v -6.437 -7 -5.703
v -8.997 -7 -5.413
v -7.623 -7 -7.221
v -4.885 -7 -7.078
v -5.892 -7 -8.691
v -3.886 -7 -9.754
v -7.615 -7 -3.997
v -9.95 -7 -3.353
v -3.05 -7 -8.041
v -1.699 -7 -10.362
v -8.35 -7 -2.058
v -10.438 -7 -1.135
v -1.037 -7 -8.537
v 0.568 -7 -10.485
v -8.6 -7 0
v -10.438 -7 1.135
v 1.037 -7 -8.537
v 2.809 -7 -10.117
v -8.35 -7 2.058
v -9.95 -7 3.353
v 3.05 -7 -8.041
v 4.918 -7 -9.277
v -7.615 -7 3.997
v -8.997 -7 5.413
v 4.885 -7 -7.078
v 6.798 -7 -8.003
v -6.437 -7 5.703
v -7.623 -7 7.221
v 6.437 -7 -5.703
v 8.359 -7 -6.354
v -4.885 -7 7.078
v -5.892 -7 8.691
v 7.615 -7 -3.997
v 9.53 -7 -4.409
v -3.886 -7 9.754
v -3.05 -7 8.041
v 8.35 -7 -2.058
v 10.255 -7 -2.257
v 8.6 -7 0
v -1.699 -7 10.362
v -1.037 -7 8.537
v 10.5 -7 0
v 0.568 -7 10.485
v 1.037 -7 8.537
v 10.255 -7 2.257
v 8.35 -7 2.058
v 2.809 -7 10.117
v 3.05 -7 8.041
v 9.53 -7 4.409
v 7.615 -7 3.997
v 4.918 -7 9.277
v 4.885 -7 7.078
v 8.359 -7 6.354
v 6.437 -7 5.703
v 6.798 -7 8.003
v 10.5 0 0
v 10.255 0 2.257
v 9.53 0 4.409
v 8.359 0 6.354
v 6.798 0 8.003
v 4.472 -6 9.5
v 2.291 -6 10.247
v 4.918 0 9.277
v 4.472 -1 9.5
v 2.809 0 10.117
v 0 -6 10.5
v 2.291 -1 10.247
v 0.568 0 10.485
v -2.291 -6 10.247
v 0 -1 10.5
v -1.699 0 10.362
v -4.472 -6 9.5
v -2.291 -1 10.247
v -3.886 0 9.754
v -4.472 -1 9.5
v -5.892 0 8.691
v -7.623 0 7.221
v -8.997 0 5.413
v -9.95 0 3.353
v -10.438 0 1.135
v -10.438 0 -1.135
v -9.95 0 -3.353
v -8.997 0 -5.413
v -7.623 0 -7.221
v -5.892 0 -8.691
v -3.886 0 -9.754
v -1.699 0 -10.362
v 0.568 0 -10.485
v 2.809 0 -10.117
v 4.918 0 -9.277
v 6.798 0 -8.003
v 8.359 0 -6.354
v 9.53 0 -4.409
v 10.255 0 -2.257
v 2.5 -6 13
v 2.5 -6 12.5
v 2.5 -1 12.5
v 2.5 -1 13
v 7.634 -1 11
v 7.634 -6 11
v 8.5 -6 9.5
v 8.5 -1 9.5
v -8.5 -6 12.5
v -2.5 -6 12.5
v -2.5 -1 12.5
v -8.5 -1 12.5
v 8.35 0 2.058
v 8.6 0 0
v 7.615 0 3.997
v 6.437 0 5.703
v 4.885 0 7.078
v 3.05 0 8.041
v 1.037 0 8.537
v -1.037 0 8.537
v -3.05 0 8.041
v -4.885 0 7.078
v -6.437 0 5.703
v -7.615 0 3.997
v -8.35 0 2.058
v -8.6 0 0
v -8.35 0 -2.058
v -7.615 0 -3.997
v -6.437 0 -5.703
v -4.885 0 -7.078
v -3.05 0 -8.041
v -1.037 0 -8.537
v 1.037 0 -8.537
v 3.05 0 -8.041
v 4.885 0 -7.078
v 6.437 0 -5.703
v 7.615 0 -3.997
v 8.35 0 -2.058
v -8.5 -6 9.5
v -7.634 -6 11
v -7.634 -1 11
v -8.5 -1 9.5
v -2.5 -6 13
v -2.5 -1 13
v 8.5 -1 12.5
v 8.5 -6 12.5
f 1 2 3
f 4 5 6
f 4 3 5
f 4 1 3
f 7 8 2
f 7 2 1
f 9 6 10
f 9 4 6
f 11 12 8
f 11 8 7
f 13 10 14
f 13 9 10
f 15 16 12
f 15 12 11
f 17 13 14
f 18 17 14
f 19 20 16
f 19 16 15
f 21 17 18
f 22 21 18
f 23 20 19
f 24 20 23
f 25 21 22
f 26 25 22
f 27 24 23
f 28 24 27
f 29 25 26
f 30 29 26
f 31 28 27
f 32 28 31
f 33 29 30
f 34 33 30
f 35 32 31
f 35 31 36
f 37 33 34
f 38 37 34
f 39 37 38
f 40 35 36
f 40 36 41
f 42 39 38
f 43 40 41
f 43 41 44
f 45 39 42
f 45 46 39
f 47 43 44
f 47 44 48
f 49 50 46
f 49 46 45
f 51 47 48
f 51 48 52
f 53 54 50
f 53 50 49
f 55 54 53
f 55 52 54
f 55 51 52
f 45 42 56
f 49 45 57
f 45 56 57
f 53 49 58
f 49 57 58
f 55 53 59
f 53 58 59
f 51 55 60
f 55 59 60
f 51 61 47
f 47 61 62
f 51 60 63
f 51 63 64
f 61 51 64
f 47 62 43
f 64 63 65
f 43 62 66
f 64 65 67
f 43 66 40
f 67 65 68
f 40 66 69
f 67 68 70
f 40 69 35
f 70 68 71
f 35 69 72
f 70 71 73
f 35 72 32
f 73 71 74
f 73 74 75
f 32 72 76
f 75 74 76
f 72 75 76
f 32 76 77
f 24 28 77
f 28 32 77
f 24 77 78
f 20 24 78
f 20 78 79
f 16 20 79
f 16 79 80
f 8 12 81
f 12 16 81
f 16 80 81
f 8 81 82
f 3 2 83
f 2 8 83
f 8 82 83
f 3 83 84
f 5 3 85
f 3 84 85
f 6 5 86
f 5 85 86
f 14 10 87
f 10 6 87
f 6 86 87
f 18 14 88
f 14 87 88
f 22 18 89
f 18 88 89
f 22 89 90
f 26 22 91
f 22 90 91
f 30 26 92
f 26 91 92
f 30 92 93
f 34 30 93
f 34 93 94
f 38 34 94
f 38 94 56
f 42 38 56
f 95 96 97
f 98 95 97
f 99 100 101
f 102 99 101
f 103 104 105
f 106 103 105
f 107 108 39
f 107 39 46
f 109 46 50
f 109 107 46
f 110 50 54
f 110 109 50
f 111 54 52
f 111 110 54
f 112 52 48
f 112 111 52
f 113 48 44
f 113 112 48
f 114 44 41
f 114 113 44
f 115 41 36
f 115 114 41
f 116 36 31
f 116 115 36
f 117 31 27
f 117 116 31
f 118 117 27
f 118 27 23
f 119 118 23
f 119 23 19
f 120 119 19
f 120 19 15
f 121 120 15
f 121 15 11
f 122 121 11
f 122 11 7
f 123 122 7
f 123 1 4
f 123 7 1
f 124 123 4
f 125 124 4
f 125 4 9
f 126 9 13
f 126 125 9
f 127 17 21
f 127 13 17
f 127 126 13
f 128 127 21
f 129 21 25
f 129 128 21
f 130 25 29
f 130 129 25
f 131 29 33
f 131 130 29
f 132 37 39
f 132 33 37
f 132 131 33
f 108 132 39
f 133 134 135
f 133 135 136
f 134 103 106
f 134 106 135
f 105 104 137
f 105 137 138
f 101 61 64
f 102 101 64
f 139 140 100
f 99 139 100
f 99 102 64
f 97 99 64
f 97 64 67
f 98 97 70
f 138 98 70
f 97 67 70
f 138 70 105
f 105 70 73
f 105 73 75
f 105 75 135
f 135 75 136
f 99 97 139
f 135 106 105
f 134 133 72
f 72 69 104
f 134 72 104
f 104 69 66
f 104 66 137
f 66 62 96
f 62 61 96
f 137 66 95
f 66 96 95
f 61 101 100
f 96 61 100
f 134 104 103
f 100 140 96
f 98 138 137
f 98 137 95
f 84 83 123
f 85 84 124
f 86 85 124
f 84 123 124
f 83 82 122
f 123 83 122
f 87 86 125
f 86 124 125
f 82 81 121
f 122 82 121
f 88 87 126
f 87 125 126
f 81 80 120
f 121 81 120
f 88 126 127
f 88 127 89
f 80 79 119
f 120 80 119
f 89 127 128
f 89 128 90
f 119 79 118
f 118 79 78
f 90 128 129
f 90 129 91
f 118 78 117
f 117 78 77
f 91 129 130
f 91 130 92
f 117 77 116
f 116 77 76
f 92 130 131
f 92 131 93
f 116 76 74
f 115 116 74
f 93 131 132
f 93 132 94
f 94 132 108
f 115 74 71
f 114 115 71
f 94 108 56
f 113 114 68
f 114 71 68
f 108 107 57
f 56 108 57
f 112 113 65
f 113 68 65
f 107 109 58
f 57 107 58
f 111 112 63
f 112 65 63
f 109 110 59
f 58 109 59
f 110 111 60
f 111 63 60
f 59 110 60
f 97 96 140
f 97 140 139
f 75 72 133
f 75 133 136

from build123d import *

# Parameters (mm, degrees)
F0_R     = 10.5
F0_R_2   = 8.6
F1_DEPTH = 7
F3_W     = 5
F3_H     = 5
F4_DEPTH = 4
F5_W     = 5
F5_H     = 3
F6_DEPTH = 6
F8_DEPTH = 25


with BuildPart() as f1:
    # F0 (on Front) → F1 (new body)
    with BuildSketch(Plane.XZ):
        Circle(F0_R)
        Circle(F0_R_2, mode=Mode.SUBTRACT)
    extrude(amount=F1_DEPTH)

    # F3 (on offset) → F4 (join)
    with BuildSketch(Plane.XY.offset(9)):
        with Locations((0, -3.5)):
            Rectangle(F3_W, F3_H)
    extrude(amount=F4_DEPTH)

    # F5 (on face) → F6 (join)
    with BuildSketch(Plane.YZ.offset(2.5)):
        with Locations((-3.5, 11)):
            Rectangle(F5_W, F5_H)
    extrude(amount=F6_DEPTH)

    # F7 (on face) → F8 (cut)
    with BuildSketch(Plane.XZ.offset(6)):
        Polygon((8.5, 9.5), (8.5, 12.5), (7.633975, 11), align=None)
    extrude(amount=-F8_DEPTH, mode=Mode.SUBTRACT)

    # F9: F1 across plane


with BuildPart() as f1_1:
    add(f1.part)
    add(f1.part.mirror(Plane.YZ))


solid = f1_1.part
